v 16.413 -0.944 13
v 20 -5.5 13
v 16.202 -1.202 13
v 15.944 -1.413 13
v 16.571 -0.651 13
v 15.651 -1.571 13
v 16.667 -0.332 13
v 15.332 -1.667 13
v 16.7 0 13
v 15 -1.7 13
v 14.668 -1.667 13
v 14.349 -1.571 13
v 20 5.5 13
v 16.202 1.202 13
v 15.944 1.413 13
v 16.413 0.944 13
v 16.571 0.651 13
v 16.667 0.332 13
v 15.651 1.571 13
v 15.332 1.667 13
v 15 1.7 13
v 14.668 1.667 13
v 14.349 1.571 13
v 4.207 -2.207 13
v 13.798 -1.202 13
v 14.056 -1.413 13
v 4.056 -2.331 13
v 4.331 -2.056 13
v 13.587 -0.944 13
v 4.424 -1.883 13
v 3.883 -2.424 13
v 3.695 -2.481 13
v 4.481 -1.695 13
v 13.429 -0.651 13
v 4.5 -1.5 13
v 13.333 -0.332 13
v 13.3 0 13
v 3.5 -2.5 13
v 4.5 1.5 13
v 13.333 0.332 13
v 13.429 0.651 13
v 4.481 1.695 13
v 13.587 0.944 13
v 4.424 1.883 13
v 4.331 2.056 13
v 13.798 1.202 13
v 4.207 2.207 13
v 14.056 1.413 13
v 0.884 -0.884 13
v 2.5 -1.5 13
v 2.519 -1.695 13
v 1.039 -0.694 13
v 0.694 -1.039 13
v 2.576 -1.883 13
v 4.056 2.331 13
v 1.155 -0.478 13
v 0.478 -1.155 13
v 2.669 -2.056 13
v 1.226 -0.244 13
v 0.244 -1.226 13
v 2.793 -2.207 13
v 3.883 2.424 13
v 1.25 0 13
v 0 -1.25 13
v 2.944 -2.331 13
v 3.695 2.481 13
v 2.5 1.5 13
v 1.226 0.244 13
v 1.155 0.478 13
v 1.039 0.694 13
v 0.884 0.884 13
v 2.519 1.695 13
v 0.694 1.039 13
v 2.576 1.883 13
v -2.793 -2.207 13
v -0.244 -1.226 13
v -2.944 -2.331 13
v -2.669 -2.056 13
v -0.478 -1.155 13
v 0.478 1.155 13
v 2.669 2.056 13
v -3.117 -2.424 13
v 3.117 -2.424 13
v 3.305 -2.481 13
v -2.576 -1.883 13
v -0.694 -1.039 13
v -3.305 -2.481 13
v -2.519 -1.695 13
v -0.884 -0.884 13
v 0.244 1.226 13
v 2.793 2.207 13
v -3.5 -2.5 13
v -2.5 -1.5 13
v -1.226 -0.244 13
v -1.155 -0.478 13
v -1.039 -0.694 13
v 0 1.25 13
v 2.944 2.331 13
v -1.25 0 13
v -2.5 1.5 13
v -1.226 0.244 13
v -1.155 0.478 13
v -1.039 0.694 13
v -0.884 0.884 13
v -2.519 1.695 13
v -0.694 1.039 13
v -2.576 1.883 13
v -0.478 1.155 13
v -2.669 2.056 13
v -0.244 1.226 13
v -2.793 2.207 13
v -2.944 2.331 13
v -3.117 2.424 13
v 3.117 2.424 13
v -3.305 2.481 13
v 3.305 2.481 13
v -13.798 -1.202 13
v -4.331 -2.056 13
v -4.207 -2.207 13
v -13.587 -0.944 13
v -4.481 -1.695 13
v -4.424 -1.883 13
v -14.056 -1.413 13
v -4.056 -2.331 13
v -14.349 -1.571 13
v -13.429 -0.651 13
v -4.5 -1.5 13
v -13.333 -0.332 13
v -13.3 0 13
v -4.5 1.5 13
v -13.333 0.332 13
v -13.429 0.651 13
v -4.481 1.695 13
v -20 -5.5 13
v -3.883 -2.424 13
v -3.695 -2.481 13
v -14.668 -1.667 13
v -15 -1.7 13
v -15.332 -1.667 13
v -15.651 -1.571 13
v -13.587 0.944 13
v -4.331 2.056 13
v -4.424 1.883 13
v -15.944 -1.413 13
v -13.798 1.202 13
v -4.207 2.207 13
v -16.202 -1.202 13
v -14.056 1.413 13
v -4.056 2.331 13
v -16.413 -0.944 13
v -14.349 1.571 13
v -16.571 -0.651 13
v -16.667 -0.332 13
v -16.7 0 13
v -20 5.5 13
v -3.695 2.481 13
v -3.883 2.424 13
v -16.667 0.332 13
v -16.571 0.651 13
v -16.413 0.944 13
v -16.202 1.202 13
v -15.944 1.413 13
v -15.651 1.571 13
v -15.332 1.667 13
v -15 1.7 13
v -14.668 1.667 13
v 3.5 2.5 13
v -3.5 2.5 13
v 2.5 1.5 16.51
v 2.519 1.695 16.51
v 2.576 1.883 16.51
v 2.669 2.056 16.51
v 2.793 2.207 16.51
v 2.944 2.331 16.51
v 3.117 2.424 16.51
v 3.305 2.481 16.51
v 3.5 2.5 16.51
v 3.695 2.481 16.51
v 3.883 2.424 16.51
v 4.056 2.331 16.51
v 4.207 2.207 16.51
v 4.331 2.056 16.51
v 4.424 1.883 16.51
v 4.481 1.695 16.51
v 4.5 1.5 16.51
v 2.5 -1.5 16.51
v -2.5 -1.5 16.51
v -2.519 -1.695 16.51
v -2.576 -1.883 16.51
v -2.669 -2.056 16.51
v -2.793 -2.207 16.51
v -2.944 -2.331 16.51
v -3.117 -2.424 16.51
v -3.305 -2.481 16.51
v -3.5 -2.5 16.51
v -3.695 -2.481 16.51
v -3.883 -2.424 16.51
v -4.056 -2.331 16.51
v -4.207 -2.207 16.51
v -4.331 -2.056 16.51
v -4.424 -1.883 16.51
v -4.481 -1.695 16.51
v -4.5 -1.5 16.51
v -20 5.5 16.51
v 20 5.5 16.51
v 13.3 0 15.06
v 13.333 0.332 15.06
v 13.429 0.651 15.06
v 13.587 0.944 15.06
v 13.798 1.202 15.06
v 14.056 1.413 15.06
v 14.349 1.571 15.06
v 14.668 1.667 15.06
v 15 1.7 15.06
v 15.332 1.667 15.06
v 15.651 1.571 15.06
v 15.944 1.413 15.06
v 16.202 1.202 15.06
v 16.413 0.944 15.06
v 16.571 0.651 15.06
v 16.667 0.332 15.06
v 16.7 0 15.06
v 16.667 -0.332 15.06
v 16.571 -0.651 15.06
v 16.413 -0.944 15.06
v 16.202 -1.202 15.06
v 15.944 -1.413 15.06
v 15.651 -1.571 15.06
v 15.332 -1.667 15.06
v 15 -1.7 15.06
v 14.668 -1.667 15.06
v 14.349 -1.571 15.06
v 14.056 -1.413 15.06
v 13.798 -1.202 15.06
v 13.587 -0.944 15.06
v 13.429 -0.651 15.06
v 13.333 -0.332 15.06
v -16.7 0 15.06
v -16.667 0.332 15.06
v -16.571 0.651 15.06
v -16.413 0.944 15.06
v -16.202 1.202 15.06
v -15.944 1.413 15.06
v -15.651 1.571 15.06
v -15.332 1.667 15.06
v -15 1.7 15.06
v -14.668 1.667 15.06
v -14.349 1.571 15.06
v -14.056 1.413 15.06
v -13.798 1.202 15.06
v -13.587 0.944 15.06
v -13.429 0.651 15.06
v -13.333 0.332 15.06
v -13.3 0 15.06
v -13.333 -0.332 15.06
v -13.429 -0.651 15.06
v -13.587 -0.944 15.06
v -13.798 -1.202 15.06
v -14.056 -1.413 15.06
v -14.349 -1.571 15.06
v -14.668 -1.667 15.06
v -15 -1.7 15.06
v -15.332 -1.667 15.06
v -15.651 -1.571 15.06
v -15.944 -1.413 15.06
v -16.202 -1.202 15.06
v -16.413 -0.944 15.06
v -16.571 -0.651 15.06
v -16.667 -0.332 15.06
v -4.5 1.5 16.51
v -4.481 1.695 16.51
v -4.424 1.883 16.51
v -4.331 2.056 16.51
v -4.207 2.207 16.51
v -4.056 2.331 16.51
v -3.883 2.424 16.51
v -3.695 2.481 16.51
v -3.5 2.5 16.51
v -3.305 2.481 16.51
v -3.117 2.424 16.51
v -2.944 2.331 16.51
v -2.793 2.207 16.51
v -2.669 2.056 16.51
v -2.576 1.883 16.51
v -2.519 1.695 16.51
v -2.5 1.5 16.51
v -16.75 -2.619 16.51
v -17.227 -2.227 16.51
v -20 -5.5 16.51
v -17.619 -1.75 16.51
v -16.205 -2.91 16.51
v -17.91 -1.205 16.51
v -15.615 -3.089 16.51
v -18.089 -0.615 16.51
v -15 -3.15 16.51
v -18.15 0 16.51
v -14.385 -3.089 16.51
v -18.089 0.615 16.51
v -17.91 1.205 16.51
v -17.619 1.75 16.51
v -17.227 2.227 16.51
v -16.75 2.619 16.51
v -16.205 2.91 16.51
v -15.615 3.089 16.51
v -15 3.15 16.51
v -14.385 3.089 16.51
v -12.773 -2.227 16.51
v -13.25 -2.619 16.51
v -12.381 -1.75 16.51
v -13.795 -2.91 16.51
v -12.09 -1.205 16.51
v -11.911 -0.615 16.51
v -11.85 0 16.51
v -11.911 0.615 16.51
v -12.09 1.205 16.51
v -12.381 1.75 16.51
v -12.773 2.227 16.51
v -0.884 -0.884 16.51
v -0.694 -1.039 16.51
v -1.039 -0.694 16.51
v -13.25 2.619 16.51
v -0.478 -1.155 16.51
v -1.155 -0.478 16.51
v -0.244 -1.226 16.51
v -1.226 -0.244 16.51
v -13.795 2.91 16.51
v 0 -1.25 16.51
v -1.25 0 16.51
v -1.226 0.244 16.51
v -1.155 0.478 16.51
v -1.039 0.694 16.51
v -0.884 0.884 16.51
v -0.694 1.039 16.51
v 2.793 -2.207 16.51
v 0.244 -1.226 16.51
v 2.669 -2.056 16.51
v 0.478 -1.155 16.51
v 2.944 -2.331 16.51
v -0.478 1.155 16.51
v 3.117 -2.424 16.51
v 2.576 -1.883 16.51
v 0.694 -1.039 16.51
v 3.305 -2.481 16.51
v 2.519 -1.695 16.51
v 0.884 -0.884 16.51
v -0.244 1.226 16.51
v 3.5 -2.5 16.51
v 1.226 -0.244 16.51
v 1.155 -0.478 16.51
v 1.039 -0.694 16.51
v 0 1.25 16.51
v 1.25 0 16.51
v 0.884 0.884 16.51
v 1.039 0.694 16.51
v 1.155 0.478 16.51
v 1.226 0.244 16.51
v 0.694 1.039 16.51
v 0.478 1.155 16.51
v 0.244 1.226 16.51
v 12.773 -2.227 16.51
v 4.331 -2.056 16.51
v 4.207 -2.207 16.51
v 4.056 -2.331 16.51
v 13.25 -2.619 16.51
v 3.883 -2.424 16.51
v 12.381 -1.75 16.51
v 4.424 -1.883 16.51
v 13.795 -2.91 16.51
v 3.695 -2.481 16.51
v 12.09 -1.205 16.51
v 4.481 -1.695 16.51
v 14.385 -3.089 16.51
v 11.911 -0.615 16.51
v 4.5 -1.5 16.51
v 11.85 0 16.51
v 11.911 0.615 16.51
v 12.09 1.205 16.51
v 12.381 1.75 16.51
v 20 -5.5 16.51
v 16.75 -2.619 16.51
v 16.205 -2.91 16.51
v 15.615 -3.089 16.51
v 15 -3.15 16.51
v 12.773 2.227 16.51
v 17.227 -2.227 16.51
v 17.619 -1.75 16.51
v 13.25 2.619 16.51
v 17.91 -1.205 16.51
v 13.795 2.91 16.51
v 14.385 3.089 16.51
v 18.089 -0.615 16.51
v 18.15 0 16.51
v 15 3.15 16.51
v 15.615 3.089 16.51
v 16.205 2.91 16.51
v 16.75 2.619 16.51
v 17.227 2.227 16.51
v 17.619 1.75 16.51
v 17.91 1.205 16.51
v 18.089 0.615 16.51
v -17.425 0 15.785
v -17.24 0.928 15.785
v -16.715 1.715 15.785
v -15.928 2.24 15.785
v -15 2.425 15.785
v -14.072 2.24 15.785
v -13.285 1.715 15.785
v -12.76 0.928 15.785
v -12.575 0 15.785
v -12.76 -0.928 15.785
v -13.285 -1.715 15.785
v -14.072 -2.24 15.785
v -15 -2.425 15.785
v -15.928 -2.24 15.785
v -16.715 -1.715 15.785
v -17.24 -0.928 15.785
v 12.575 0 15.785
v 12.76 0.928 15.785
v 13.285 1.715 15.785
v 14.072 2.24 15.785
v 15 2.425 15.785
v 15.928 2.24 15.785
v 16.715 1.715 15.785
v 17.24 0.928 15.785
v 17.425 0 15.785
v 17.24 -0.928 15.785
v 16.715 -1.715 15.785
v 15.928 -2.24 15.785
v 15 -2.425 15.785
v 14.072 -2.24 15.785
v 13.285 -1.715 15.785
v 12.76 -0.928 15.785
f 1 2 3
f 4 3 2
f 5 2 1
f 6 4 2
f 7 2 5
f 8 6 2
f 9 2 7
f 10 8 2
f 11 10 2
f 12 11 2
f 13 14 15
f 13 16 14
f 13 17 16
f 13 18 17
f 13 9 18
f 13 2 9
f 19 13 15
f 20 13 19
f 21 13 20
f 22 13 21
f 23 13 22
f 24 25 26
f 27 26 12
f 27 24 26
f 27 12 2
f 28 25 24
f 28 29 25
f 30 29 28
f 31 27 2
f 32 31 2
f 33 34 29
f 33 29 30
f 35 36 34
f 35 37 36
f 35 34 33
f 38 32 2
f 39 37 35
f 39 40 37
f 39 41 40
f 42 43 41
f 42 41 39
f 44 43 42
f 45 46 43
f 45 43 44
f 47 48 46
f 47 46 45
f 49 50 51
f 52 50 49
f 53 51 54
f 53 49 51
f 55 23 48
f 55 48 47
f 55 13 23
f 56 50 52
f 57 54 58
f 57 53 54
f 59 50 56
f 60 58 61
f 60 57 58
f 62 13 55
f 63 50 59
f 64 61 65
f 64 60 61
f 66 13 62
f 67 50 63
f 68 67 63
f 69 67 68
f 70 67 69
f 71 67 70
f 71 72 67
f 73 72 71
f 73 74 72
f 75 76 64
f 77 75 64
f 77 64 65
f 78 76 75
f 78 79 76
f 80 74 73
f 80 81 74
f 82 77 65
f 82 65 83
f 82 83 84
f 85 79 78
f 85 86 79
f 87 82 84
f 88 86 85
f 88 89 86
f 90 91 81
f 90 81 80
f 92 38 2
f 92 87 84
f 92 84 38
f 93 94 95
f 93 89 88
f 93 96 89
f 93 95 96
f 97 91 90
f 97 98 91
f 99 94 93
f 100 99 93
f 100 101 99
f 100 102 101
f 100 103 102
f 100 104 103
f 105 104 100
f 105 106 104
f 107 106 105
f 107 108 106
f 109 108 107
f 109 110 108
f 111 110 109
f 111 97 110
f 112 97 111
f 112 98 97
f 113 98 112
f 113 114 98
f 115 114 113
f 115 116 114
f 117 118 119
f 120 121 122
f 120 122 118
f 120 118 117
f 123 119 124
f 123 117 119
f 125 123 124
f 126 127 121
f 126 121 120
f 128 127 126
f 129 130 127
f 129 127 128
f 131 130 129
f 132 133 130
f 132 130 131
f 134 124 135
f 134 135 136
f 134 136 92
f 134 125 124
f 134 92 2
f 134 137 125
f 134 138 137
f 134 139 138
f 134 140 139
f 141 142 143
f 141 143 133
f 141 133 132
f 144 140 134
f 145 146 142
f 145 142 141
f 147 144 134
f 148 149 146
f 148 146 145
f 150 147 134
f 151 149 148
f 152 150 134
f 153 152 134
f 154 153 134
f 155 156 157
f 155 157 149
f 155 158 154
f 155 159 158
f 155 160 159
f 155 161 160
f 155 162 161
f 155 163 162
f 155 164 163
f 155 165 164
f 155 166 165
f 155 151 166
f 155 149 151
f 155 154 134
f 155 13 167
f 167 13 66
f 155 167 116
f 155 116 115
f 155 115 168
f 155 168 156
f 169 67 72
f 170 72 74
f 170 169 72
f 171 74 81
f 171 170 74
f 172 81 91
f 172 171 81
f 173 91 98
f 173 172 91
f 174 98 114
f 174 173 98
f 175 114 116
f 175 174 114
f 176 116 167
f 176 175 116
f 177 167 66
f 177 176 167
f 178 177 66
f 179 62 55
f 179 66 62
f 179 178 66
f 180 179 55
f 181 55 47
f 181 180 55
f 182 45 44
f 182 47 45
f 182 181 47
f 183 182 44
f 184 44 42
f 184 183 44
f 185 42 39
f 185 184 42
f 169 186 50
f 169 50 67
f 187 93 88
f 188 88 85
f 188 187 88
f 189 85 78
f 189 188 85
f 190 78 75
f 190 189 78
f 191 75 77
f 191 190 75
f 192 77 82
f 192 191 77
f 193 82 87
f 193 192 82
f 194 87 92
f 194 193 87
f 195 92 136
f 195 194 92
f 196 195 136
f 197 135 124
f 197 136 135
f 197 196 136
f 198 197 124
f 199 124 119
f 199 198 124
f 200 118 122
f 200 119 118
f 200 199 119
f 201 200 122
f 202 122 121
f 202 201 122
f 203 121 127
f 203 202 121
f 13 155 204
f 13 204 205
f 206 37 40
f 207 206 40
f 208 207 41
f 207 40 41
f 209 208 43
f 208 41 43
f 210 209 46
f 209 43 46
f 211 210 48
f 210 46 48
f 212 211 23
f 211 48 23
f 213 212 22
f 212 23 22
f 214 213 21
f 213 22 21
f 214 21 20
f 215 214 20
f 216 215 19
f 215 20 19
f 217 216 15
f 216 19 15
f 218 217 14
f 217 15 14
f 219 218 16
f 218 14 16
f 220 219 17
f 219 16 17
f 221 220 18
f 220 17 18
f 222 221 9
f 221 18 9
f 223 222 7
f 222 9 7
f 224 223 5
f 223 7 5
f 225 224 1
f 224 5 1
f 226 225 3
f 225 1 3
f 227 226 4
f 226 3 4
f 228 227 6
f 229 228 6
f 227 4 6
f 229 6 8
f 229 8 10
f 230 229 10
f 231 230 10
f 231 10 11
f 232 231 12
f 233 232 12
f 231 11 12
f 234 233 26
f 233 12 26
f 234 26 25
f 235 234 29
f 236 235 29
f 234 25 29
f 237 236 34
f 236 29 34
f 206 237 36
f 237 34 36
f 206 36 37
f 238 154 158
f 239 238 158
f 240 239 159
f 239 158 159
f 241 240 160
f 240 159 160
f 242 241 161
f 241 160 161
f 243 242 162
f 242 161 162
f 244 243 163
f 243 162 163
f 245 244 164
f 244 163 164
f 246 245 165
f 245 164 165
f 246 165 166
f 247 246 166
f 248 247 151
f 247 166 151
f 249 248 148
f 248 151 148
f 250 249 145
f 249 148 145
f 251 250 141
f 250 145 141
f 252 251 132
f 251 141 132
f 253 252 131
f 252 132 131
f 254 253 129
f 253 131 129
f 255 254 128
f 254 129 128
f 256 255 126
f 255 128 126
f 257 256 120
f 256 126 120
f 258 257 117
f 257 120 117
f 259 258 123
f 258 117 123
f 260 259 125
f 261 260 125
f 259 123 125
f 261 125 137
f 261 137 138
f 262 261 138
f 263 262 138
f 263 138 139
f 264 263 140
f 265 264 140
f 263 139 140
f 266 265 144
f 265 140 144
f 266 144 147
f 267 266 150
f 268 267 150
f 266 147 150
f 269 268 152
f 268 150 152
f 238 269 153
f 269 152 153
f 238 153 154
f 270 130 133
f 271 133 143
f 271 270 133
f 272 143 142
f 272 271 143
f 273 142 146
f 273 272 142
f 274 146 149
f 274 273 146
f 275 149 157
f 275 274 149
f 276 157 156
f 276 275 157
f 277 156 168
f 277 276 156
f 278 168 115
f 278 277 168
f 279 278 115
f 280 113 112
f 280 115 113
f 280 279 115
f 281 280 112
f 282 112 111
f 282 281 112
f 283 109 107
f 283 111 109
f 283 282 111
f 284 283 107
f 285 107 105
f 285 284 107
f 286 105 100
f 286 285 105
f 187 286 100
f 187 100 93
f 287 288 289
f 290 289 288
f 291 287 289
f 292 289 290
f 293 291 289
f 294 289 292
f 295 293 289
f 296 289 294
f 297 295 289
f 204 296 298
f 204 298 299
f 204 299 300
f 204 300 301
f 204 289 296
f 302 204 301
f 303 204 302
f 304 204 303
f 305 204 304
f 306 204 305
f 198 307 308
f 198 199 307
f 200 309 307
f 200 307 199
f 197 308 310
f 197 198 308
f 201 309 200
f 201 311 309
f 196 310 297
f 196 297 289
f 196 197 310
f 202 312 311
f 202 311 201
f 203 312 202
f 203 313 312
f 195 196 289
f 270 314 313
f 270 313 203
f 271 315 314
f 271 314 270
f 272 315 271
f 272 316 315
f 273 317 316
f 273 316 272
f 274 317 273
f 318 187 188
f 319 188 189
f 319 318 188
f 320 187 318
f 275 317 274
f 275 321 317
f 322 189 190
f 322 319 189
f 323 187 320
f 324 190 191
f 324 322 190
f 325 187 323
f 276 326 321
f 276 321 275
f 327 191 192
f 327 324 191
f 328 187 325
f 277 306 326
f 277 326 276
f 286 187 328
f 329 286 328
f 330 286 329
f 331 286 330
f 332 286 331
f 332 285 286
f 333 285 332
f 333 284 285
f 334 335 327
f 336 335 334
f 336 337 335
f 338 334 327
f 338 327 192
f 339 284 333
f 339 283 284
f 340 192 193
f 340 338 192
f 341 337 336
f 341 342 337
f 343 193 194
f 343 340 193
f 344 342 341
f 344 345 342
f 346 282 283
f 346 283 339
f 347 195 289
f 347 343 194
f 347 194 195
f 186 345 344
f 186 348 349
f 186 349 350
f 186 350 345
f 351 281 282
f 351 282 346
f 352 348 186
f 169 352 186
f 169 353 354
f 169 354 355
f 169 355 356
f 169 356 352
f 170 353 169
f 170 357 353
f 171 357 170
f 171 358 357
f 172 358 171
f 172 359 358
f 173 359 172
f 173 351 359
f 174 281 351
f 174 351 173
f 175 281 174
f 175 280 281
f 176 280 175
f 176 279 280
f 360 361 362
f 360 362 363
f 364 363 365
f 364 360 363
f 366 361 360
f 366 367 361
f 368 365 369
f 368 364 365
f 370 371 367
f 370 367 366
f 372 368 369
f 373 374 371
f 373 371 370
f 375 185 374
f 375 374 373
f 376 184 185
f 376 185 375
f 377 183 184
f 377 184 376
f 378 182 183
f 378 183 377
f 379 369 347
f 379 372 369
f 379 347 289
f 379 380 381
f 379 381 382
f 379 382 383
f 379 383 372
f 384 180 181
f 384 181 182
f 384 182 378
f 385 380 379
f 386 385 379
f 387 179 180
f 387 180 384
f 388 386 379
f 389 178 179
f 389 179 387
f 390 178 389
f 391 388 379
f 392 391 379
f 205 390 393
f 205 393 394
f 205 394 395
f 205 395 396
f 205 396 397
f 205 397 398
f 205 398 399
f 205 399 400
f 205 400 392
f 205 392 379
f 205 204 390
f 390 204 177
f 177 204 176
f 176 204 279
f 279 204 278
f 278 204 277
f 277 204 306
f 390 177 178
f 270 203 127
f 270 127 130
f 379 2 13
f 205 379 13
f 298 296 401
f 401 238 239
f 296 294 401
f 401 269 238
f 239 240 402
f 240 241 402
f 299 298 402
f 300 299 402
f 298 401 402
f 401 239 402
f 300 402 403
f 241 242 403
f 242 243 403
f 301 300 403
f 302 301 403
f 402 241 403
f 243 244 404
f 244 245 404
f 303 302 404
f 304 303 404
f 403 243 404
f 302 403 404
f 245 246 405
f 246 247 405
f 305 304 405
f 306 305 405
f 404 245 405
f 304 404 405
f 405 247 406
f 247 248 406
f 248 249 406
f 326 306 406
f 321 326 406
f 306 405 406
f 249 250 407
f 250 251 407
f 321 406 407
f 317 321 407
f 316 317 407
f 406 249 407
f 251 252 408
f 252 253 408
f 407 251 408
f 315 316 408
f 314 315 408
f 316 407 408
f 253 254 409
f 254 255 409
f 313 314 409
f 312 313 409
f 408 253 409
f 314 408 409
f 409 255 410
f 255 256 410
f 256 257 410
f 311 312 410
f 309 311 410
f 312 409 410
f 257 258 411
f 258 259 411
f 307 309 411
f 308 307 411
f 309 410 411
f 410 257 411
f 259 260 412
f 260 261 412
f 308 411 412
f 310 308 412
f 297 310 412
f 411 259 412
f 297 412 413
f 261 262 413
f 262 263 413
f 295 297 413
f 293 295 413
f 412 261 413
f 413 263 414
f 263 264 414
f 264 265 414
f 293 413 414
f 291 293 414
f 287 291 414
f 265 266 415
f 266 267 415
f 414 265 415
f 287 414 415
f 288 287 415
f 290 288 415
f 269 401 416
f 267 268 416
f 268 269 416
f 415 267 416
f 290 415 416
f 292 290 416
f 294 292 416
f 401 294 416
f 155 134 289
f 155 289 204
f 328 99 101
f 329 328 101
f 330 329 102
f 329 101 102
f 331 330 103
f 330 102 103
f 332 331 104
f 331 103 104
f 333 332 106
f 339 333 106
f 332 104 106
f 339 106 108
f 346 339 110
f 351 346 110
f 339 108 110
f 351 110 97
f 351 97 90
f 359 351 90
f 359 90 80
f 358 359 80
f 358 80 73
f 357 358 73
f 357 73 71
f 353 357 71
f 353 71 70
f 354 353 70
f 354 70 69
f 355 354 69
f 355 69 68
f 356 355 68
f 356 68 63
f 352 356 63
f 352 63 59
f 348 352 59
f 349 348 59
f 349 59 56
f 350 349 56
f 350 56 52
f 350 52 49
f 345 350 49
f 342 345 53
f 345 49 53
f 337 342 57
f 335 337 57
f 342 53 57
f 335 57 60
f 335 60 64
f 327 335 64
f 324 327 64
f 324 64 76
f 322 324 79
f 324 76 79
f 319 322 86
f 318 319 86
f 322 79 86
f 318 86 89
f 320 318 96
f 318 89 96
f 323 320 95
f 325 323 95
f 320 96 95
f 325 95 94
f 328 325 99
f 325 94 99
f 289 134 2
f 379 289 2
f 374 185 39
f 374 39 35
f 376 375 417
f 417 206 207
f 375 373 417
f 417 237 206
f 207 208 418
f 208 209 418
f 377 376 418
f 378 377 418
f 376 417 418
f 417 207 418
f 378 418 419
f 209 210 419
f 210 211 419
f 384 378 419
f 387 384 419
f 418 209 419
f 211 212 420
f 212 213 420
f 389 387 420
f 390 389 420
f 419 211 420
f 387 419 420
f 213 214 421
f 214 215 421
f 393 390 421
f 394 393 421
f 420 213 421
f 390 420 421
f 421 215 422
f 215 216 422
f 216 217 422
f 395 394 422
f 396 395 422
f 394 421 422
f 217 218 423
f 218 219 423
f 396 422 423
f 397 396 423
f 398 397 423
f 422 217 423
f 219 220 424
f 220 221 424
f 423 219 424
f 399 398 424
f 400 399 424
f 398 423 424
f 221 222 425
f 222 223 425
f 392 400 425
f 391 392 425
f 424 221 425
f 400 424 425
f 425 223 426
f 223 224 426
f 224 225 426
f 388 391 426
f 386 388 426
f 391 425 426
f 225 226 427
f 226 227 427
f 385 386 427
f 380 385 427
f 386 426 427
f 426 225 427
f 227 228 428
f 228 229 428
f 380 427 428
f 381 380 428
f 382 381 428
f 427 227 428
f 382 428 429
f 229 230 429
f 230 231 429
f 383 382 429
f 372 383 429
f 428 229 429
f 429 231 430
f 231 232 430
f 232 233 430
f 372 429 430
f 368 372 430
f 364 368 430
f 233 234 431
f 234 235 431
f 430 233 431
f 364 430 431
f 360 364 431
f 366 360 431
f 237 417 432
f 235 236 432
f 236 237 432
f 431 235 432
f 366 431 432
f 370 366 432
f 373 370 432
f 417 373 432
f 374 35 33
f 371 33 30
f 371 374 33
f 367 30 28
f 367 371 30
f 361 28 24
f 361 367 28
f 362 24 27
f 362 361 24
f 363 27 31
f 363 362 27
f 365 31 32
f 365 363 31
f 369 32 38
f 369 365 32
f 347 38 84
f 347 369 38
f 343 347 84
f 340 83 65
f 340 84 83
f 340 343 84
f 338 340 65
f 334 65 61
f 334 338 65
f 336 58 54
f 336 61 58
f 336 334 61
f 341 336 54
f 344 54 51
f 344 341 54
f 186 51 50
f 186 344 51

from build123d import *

# Parameters (mm, degrees)
ESQUISSE1_W                                        = 40
ESQUISSE1_H                                        = 11
ESQUISSE1_R                                        = 4
BOSS_EXTRU_1_DEPTH                                 = 9.51
ESQUISSE16_W                                       = 40
ESQUISSE16_H                                       = 11
BOSS_EXTRU_2_DEPTH                                 = 7
D_GAGEMENT_M32_D                                   = 2.5
ENL_V_MAT_EXTRU_1_DEPTH                            = 7
CHAMBRAGE_POUR_VIS_T_TE_RONDE_BOMB_E_M_D           = 3.4
CHAMBRAGE_POUR_VIS_T_TE_RONDE_BOMB_E_M_CBORE_D     = 6
CHAMBRAGE_POUR_VIS_T_TE_RONDE_BOMB_E_M_CBORE_DEPTH = 2.4
FRAISAGE_POUR_VIS_T_TE_FRAIS_E_M31_D               = 3.4
FRAISAGE_POUR_VIS_T_TE_FRAIS_E_M31_DEPTH           = 6
FRAISAGE_POUR_VIS_T_TE_FRAIS_E_M31_CSINK_D         = 6.3
FRAISAGE_POUR_VIS_T_TE_FRAIS_E_M31_CSINK_ANGLE     = 90
FRAISAGE_POUR_VIS_T_TE_FRAIS_E_M31_TIP             = 1.021463052
ESQUISSE33_W                                       = 53.617438424
ESQUISSE33_H                                       = 31.43157248
ENL_V_MAT_EXTRU_4_DEPTH                            = 13


with BuildPart() as part:
    # Esquisse1 → Boss.-Extru.1 (new body)
    with BuildSketch(Plane.XY):
        Rectangle(ESQUISSE1_W, ESQUISSE1_H)
        Circle(ESQUISSE1_R, mode=Mode.SUBTRACT)
    extrude(amount=BOSS_EXTRU_1_DEPTH)

    # Esquisse16 → Boss.-Extru.2 (add)
    with BuildSketch(Plane.XY.offset(9.51)):
        Rectangle(ESQUISSE16_W, ESQUISSE16_H)
    extrude(amount=BOSS_EXTRU_2_DEPTH)

    # Dégagement M32 (through all)
    with Locations(Plane.XY.offset(16.51)):
        with Locations((0, 0)):
            Hole(D_GAGEMENT_M32_D / 2)

    # Esquisse19 → Enlèv. mat.-Extru.1 (cut)
    with BuildSketch(Plane.XY.offset(16.51)):
        with BuildLine():
            Line((-2.5, 1.5), (-2.5, -1.5))
            ThreePointArc((-2.5, -1.5), (-3.5, -2.5), (-4.5, -1.5))
            Line((-4.5, -1.5), (-4.5, 1.5))
            ThreePointArc((-4.5, 1.5), (-3.5, 2.5), (-2.5, 1.5))
        make_face()
        with BuildLine():
            Line((4.5, 1.5), (4.5, -1.5))
            ThreePointArc((4.5, -1.5), (3.5, -2.5), (2.5, -1.5))
            Line((2.5, -1.5), (2.5, 1.5))
            ThreePointArc((2.5, 1.5), (3.5, 2.5), (4.5, 1.5))
        make_face()
    extrude(amount=-ENL_V_MAT_EXTRU_1_DEPTH, mode=Mode.SUBTRACT)

    # Chambrage pour vis _ t_te ronde bomb_e M (through all)
    with Locations(Plane(origin=(0, 5.5, 0), x_dir=(1, 0, 0), z_dir=(0, 1, 0))):
        with Locations((14, -6.51), (-14, -6.51)):
            CounterBoreHole(CHAMBRAGE_POUR_VIS_T_TE_RONDE_BOMB_E_M_D / 2, CHAMBRAGE_POUR_VIS_T_TE_RONDE_BOMB_E_M_CBORE_D / 2, CHAMBRAGE_POUR_VIS_T_TE_RONDE_BOMB_E_M_CBORE_DEPTH)

    # Fraisage pour vis à tête fraisée M31
    with Locations(Plane.XY.offset(16.51)):
        with Locations((-15, 0), (15, 0)):
            CounterSinkHole(FRAISAGE_POUR_VIS_T_TE_FRAIS_E_M31_D / 2, FRAISAGE_POUR_VIS_T_TE_FRAIS_E_M31_CSINK_D / 2, depth=FRAISAGE_POUR_VIS_T_TE_FRAIS_E_M31_DEPTH, counter_sink_angle=FRAISAGE_POUR_VIS_T_TE_FRAIS_E_M31_CSINK_ANGLE)
            with Locations((0, 0, -(FRAISAGE_POUR_VIS_T_TE_FRAIS_E_M31_DEPTH + FRAISAGE_POUR_VIS_T_TE_FRAIS_E_M31_TIP / 2))):  # 118° drill point
                Cone(0, FRAISAGE_POUR_VIS_T_TE_FRAIS_E_M31_D / 2, FRAISAGE_POUR_VIS_T_TE_FRAIS_E_M31_TIP, mode=Mode.SUBTRACT)

    # Esquisse33 → Enlèv. mat.-Extru.4 (cut)
    with BuildSketch(Plane(origin=(0, 0, 0), x_dir=(-1, 0, 0), z_dir=(0, 0, -1))):
        Rectangle(ESQUISSE33_W, ESQUISSE33_H)
    extrude(amount=-ENL_V_MAT_EXTRU_4_DEPTH, mode=Mode.SUBTRACT)


solid = part.part
